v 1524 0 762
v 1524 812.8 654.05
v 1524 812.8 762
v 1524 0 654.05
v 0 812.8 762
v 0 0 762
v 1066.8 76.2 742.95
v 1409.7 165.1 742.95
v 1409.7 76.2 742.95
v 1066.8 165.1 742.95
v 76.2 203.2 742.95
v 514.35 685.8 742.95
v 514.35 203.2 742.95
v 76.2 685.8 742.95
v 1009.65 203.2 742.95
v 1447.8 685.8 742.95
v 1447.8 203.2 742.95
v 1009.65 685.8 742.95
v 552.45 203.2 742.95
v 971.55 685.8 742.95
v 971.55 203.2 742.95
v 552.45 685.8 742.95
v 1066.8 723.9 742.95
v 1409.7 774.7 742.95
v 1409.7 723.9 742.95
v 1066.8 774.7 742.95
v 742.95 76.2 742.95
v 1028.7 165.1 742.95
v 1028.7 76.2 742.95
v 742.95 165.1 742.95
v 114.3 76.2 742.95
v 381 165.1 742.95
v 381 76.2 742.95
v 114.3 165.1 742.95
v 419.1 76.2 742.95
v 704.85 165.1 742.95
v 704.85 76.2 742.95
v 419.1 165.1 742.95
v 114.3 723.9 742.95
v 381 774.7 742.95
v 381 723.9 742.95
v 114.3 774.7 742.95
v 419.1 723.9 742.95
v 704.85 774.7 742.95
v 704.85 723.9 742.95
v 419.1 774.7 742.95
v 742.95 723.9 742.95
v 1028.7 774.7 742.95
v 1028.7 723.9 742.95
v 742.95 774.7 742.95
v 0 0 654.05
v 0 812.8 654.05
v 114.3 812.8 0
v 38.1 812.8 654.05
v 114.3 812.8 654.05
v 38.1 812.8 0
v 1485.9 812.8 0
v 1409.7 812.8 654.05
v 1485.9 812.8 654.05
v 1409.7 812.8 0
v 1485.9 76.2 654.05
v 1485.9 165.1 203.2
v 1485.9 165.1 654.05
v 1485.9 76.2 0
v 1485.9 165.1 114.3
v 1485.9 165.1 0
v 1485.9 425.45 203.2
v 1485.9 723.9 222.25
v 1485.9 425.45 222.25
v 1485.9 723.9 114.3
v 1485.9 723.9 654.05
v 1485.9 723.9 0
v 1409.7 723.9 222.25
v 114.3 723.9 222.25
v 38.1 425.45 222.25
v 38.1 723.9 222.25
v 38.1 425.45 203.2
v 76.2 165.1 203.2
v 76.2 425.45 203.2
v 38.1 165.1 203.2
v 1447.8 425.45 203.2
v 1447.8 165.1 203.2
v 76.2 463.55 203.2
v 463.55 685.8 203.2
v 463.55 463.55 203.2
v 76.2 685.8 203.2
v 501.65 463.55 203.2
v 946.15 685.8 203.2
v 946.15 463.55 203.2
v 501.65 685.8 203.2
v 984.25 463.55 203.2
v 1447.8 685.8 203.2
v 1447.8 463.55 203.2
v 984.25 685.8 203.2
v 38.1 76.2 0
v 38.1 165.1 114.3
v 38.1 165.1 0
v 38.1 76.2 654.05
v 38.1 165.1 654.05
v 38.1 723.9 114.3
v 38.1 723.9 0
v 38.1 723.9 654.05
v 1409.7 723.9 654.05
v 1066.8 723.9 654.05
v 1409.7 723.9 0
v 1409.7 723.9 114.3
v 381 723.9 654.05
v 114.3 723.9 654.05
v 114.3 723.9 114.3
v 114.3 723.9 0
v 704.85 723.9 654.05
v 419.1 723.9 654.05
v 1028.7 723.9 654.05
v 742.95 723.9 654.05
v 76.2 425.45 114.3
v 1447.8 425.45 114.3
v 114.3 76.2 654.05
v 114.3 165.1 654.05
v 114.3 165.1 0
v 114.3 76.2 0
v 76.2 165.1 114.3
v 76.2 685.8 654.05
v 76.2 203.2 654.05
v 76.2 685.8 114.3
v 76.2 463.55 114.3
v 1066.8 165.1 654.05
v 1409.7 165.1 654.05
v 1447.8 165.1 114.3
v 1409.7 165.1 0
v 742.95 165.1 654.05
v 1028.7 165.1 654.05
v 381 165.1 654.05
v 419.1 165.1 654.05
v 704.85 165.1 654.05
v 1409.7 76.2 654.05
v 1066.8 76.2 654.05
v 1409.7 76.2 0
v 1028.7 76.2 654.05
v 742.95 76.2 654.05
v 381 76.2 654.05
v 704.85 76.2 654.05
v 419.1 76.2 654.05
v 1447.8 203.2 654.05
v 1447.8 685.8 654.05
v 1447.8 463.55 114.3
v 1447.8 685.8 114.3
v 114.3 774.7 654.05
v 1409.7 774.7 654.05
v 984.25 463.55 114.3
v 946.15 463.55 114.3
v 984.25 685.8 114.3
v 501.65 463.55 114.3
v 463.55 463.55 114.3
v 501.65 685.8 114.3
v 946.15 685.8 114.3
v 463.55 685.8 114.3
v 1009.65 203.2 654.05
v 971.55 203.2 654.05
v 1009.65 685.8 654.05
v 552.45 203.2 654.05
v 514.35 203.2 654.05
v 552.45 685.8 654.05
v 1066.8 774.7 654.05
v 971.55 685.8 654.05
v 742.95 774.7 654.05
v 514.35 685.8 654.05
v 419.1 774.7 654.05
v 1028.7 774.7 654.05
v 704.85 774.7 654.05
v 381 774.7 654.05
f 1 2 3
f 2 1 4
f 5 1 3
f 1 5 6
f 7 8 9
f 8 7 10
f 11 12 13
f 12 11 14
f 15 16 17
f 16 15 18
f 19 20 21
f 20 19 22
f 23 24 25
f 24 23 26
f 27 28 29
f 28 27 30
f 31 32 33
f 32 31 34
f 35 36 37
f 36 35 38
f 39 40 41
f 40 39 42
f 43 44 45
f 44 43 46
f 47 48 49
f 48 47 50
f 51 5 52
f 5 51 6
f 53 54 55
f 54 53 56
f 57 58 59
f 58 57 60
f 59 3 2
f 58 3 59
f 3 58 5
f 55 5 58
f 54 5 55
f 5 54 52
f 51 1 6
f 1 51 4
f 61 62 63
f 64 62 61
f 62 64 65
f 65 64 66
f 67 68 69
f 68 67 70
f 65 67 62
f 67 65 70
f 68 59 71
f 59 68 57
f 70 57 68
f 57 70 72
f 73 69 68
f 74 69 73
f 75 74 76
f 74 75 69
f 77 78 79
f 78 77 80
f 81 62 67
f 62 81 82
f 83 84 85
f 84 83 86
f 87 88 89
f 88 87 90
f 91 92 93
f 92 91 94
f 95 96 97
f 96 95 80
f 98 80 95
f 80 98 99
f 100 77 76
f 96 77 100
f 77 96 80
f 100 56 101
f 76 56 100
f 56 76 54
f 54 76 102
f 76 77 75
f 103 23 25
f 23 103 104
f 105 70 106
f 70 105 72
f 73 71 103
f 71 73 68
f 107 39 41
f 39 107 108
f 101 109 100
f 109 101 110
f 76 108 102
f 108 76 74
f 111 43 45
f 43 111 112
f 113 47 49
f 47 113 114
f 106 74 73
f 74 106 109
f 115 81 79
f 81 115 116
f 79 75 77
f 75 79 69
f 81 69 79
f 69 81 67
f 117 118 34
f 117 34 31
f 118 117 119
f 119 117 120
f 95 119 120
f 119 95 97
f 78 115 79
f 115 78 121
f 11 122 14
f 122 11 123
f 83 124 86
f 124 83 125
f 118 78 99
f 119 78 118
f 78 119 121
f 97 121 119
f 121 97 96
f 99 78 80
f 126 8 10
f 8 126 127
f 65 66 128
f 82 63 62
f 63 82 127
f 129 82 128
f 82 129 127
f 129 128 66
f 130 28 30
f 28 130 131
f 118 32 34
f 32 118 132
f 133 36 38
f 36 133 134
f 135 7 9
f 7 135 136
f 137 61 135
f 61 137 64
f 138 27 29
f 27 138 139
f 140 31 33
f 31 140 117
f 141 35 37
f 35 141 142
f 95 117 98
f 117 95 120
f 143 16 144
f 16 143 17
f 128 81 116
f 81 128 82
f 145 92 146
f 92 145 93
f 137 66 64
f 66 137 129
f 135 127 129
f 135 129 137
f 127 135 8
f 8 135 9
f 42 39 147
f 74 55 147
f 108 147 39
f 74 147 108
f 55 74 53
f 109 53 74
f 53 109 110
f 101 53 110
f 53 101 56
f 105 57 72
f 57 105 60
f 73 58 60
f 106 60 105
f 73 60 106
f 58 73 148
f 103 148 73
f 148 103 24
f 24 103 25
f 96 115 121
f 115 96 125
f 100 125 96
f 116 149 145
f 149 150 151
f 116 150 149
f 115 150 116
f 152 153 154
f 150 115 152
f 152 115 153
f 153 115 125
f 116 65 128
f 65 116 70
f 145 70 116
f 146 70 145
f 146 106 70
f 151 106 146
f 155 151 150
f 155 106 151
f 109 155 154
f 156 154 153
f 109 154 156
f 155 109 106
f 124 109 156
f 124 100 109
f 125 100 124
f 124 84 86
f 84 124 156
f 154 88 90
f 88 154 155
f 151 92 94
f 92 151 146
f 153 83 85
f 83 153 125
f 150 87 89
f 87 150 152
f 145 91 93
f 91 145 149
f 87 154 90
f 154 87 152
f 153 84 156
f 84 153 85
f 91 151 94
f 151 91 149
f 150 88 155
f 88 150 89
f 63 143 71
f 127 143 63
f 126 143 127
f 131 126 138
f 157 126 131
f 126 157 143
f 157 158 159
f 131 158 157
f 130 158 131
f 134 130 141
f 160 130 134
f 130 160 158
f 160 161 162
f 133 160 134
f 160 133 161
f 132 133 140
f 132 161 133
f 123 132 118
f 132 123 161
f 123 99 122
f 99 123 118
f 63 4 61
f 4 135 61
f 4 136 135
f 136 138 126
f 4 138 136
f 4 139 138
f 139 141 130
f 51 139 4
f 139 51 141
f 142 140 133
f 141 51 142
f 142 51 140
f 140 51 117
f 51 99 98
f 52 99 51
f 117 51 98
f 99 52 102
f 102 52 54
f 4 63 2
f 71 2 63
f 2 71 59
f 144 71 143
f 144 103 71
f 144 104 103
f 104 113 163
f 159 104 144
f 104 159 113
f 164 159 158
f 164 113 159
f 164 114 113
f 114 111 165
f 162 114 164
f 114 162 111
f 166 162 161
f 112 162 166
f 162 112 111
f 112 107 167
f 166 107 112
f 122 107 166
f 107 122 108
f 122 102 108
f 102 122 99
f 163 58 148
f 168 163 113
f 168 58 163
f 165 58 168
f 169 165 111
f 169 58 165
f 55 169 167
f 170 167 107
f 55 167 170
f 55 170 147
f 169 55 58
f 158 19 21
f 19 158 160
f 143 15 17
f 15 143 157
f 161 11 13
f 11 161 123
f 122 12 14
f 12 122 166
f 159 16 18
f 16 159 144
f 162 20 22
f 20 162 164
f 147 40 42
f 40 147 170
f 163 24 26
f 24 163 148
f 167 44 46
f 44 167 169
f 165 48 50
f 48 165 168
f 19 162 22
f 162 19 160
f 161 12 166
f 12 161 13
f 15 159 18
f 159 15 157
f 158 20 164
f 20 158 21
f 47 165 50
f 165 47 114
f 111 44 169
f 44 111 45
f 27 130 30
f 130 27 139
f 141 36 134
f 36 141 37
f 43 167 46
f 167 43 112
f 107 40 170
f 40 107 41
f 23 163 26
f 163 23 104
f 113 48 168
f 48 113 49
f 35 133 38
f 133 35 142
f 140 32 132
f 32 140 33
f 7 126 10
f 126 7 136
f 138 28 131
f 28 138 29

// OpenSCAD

// inches or mm?
units=1;			// [1:inches,0:mm]

benchWidth=60;

benchHeight=30;

benchDepth=32;

braceHeight=8;
// 0 = no top
topThickness=0.75;


// this is an openScad parametric version of Thingiverse item 1456181 by JenniferG

// stud orientation
hx=1*1;	// horizontal x
hy=2*1;	// horizontal y
v=3*1;	// vertical

module stud(length=72,orient=v) {
	echo(length = length);
	if (orient==hy) {
		cube([1.5,length,3.5]);
	} else if (orient==hx) {
		cube([length,1.5,3.5]);
	} else {
		cube([1.5,3.5,length]);
	}		
}

module bench(length=72,width=24,height=32,braceHeight=8,topThickness=0.75) {
	// legs
	translate([3,3,0]) stud(height-topThickness);
	translate([3+length-6-1.5,3,0]) stud(height-topThickness);
	translate([3,3+width-3.5-3,0]) stud(height-topThickness);
	translate([3+length-6-1.5,3+width-3.5-3,0]) stud(height-topThickness);
	// leg doublers - left
	translate([1.5,3,braceHeight]) stud(height-braceHeight-3.5);	
	translate([1.5,3,0]) stud(braceHeight-3.5);
	translate([1.5,3+width-3.5-3,braceHeight]) stud(height-braceHeight-3.5);
	translate([1.5,3+width-3.5-3,0]) stud(braceHeight-3.5);
	// leg doublers - right
	translate([3+length-6,3,braceHeight]) stud(height-braceHeight-3.5);
	translate([3+length-6,3,0]) stud(braceHeight-3.5);
	translate([3+length-6,3+width-3.5-3,braceHeight]) stud(height-braceHeight-3.5);
	translate([3+length-6,3+width-3.5-3,0]) stud(braceHeight-3.5);
	// leg braces
	translate([1.5,3,braceHeight-3.5]) stud(width-3, orient=hy);
	translate([3+length-6,3,braceHeight-3.5]) stud(width-3, orient=hy);

	// lower brace
	translate([1.5,width-5,braceHeight-3.5]) stud(length-3, orient=hx);
	translate([1.5,3+(width-3)/2-0.75,braceHeight-3.5]) stud(length-3, orient=hx);
	// lower brace fillers
	translate([(length-3)/3-0.75,3+(width-3)/2+0.75,braceHeight-3.5]) stud(width-5-3-(width-3)/2-0.75, orient=hy);
	translate([(length-3)*2/3-0.75,3+(width-3)/2+0.75,braceHeight-3.5]) stud(width-5-3-(width-3)/2-0.75, orient=hy);

	// horizontals
	translate([1.5,1.5,height-topThickness-3.5]) stud(length-3, orient=hx);
	translate([0,0,height-topThickness-3.5]) stud(length, orient=hx);
	translate([3,1.5+3.5+1.5,height-topThickness-3.5]) stud(length-6, orient=hx);
	translate([3,3+width-3.5-3-1.5,height-topThickness-3.5]) stud(length-6, orient=hx);
	translate([4.5,3+width-3.5-3-1.5+3.5,height-topThickness-3.5]) stud(length-9, orient=hx);
	
	// front-to-backs
	translate([0,1.5,height-topThickness-3.5]) stud(width-1.5, orient=hy);
	translate([1.5,3,height-topThickness-3.5]) stud(width-3, orient=hy);
	translate([length-1.5,1.5,height-topThickness-3.5]) stud(width-1.5, orient=hy);
	translate([length-3,3,height-topThickness-3.5]) stud(width-3, orient=hy);
	
	// fillers
	translate([(length-6)/3-0.75+3,8,height-topThickness-3.5]) stud(width-13, orient=hy);
	translate([(length-6)*2/3-0.75+3,8,height-topThickness-3.5]) stud(width-13, orient=hy);
	translate([(length-9)*2/4-0.75+3,width-3.5,height-topThickness-3.5]) stud(2, orient=hy);
	translate([(length-9)*2/4-0.75+3,3,height-topThickness-3.5]) stud(3.5, orient=hy);

	// these fillers are probably overkill - leaving them in since original design by JenniferG had them
	translate([(length-9)*1/4-0.75+3,width-3.5,height-topThickness-3.5]) stud(2, orient=hy);
	translate([(length-9)*3/4-0.75+3,width-3.5,height-topThickness-3.5]) stud(2, orient=hy);		
	translate([(length-9)*1/4-0.75+3,3,height-topThickness-3.5]) stud(3.5, orient=hy);
	translate([(length-9)*3/4-0.75+3,3,height-topThickness-3.5]) stud(3.5, orient=hy);	
	
	// and finally...the top sheet
	if (topThickness > 0) {
		translate([0,0,height-topThickness]) cube([length,width,topThickness]);
		// and even a lower shelf while we're at it
		translate([1.5,3+(width-3)/2-0.75,braceHeight]) cube([length-3,(width-3)/2+0.75-3.5,topThickness]);
		// if I were making this in real life, I'd have fit the lower shelf around the back legs...but I'm too lazy right now	
	}
}

//scaleFactor = (units == "inches")?25.4:1;
scaleFactor = units*24.4+1;

scale(scaleFactor) {
	bench(benchWidth,benchDepth,benchHeight,braceHeight,topThickness);
}
